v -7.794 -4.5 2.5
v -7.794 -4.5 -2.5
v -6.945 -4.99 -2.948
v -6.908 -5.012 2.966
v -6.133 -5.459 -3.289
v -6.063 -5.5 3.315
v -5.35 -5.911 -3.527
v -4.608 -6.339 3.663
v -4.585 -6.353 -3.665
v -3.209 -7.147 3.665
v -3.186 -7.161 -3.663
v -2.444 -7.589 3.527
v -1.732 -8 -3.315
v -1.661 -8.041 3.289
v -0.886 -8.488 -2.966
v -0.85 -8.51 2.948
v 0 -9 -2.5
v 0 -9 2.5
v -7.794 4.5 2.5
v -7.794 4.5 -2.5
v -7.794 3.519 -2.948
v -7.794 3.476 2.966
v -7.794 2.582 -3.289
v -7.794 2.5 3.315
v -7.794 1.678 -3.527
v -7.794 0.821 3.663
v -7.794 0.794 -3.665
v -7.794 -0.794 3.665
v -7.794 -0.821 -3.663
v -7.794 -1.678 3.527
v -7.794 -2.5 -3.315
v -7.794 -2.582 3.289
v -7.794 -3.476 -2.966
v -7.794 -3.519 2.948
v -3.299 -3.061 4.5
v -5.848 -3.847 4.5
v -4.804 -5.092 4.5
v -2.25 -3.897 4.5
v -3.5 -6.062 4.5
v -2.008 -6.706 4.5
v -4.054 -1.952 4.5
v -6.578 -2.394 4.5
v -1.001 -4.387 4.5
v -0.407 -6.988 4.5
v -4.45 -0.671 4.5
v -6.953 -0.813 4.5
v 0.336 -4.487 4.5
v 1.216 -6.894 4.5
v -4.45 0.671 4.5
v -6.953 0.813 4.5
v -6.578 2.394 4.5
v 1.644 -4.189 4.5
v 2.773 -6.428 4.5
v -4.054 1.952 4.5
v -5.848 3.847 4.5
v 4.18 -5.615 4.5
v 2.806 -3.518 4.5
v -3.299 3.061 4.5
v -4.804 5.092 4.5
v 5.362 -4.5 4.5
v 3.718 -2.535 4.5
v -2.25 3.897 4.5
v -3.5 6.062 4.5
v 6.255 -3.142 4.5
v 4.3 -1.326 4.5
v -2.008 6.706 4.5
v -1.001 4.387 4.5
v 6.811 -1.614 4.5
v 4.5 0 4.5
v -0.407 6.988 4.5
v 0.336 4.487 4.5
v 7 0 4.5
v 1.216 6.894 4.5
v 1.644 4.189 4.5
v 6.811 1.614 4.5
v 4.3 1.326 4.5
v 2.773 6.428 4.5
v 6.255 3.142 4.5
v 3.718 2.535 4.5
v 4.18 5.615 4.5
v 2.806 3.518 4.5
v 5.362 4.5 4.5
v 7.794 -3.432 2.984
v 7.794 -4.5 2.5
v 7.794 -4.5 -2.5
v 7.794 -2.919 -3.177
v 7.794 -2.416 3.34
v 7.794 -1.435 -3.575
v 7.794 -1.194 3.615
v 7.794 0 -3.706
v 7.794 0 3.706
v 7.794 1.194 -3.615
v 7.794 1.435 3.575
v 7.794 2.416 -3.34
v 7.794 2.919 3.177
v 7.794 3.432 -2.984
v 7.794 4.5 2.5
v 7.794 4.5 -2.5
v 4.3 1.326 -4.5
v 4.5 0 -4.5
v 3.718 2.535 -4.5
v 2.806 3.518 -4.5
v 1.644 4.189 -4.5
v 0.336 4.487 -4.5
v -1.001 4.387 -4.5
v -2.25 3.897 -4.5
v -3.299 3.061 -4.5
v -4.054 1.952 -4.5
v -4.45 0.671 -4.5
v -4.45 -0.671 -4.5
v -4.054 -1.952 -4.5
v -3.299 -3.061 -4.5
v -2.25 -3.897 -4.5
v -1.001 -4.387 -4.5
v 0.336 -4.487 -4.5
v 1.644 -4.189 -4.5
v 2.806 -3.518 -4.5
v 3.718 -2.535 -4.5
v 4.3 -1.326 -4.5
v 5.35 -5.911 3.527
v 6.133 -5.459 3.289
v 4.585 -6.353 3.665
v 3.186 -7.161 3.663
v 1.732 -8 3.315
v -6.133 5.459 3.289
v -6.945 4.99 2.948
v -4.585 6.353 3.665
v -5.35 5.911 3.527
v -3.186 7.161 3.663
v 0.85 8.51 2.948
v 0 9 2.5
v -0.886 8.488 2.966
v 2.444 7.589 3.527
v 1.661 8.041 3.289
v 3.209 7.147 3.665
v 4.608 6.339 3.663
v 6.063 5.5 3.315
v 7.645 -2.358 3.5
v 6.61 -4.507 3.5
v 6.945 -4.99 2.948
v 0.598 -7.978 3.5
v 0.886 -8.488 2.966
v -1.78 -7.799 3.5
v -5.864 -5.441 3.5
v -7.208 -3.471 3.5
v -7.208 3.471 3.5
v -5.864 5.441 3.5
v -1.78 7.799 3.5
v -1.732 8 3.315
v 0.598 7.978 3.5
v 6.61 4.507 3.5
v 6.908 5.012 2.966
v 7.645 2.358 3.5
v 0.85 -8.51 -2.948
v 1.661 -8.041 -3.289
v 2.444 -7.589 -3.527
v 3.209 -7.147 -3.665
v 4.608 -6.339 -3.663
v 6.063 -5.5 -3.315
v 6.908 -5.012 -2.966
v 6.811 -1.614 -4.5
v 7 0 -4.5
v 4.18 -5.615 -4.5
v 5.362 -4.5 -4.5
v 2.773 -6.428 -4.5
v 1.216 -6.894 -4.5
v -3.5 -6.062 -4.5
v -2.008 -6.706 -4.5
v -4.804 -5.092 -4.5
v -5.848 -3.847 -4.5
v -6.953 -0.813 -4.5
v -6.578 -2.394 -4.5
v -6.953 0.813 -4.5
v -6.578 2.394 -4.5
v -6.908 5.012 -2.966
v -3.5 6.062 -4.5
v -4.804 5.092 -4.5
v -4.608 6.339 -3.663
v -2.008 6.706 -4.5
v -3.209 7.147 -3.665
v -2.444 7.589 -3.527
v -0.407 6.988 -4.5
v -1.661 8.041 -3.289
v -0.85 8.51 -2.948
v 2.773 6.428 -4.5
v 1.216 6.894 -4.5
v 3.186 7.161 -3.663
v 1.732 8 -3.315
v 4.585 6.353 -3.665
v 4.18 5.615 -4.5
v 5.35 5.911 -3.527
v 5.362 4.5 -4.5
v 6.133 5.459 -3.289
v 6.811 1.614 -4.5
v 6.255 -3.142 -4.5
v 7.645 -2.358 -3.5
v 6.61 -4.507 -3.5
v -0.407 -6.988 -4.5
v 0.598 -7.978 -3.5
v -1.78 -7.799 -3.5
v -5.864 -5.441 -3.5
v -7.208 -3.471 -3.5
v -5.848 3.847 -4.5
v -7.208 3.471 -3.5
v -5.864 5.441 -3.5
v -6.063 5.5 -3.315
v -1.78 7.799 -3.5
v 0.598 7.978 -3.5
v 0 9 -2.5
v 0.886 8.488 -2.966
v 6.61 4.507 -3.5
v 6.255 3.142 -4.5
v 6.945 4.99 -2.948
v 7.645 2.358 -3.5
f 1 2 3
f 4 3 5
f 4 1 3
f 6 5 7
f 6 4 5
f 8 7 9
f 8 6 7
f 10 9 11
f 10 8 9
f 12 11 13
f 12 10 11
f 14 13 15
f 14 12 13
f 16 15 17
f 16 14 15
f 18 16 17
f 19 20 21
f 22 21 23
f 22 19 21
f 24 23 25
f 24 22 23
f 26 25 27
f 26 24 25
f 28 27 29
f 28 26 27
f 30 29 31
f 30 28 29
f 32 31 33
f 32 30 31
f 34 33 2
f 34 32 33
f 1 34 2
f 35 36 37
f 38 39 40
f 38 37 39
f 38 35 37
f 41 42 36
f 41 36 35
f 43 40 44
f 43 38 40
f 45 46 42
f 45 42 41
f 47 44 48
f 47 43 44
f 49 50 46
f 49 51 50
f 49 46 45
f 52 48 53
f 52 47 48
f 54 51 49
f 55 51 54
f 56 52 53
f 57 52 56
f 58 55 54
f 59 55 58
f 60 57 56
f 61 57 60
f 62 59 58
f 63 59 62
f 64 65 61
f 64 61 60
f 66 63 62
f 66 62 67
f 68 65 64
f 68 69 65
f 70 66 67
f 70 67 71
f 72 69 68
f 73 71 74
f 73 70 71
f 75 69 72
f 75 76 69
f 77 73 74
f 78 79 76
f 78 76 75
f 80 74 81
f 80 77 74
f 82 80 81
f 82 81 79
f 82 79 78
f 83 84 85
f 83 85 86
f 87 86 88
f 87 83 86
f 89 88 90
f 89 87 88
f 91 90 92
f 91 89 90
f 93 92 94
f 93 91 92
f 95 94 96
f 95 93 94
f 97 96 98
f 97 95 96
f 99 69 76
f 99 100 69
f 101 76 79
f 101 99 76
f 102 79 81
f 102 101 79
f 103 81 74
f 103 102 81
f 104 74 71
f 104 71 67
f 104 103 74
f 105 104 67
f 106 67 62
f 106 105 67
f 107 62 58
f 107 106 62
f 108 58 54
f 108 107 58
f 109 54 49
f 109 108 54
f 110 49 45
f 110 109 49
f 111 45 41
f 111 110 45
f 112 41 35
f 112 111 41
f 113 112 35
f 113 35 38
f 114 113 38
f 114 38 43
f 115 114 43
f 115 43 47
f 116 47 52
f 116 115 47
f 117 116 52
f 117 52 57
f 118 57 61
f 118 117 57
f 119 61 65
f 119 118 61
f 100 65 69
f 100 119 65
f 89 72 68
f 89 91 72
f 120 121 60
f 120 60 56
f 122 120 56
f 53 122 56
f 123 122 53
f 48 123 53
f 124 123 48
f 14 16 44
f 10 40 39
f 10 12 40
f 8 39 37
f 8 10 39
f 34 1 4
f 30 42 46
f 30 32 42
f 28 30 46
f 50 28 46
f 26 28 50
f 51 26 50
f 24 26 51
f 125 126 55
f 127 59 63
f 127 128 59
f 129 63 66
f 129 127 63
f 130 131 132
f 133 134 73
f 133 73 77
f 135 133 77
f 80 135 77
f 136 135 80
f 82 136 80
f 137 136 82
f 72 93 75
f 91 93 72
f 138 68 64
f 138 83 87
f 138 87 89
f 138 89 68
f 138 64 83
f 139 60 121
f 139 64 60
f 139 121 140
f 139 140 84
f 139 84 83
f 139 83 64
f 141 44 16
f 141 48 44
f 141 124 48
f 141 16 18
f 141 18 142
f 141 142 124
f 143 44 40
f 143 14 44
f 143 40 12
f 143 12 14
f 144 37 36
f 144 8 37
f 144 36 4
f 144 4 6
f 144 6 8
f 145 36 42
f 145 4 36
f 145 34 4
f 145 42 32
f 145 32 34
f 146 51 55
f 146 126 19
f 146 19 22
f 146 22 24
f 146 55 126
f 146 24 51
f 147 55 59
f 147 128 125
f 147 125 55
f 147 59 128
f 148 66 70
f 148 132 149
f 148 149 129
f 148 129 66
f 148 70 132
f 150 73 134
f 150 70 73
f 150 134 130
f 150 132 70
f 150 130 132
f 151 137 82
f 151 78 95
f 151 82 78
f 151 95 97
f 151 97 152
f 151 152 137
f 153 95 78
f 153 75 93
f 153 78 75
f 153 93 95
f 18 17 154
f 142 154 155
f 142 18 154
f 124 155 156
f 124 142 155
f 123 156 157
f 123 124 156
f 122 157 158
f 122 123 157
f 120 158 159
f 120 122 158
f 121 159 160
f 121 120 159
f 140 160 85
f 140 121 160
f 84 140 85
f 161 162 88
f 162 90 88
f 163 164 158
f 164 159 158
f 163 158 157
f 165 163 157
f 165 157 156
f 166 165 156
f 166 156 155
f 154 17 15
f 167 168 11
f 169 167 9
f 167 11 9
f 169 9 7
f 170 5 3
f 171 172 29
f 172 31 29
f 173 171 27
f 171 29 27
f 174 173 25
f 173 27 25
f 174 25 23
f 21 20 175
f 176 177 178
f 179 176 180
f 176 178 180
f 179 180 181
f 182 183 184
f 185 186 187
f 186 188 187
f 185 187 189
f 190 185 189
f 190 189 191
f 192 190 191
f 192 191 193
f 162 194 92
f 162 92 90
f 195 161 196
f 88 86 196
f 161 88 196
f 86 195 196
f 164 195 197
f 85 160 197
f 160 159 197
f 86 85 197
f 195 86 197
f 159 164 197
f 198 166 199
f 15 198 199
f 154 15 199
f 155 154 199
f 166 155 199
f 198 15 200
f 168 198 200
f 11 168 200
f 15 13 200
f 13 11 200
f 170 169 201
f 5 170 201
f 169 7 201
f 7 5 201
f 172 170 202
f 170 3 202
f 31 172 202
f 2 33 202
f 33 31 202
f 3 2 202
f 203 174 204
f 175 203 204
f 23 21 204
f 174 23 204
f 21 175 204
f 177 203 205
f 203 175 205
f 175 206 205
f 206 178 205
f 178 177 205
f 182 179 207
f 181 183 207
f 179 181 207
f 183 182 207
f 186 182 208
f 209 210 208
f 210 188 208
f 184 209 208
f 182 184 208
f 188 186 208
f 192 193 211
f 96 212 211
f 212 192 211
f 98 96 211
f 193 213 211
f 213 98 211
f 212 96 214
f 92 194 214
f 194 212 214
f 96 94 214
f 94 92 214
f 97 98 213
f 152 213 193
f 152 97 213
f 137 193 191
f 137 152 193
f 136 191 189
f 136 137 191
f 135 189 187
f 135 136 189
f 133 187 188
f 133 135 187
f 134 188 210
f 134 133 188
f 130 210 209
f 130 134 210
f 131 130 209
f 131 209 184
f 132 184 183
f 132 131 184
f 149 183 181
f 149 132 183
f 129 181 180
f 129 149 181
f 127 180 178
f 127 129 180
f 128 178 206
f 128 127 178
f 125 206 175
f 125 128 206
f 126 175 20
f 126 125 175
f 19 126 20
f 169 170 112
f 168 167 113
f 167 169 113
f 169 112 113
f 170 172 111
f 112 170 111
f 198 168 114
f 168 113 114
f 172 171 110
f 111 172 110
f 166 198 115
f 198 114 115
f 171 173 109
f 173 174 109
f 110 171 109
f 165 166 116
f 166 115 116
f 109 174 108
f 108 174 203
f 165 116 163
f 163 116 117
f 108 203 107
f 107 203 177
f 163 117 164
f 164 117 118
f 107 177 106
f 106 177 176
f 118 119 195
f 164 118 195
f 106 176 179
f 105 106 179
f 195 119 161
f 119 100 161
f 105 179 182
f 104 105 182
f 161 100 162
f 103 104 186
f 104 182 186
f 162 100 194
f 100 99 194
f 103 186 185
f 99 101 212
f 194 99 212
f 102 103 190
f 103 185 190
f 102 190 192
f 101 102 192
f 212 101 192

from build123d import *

# Parameters (mm, degrees)
SKETCH1_R           = 4.5
BOSS_EXTRUDE1_DEPTH = 4.5
SKETCH2_OUTSIDE_W   = 40.68
SKETCH2_OUTSIDE_H   = 43.092
SKETCH2_OUTSIDE_R   = 7
CUT_EXTRUDE1_DEPTH  = 9
CUT_EXTRUDE1_TAPER  = 45


with BuildPart() as part:
    # Sketch1 → Boss-Extrude1 (new body, symmetric)
    with BuildSketch(Plane.XY):
        Polygon((7.794228634, -4.5), (7.794228634, 4.5), (0, 9), (-7.794228634, 4.5), (-7.794228634, -4.5), (0, -9), align=None)
        Circle(SKETCH1_R, mode=Mode.SUBTRACT)
    extrude(amount=BOSS_EXTRUDE1_DEPTH, both=True)

    # Sketch2 outside → Cut-Extrude1 (cut)
    with BuildSketch(Plane.XY.offset(4.5)):
        Rectangle(SKETCH2_OUTSIDE_W, SKETCH2_OUTSIDE_H)
        Circle(SKETCH2_OUTSIDE_R, mode=Mode.SUBTRACT)
    cut_extrude1 = extrude(amount=-CUT_EXTRUDE1_DEPTH, taper=CUT_EXTRUDE1_TAPER, mode=Mode.SUBTRACT)

    # Mirror1: Cut-Extrude1 across plane
    add(cut_extrude1.mirror(Plane.XY), mode=Mode.SUBTRACT)


solid = part.part
